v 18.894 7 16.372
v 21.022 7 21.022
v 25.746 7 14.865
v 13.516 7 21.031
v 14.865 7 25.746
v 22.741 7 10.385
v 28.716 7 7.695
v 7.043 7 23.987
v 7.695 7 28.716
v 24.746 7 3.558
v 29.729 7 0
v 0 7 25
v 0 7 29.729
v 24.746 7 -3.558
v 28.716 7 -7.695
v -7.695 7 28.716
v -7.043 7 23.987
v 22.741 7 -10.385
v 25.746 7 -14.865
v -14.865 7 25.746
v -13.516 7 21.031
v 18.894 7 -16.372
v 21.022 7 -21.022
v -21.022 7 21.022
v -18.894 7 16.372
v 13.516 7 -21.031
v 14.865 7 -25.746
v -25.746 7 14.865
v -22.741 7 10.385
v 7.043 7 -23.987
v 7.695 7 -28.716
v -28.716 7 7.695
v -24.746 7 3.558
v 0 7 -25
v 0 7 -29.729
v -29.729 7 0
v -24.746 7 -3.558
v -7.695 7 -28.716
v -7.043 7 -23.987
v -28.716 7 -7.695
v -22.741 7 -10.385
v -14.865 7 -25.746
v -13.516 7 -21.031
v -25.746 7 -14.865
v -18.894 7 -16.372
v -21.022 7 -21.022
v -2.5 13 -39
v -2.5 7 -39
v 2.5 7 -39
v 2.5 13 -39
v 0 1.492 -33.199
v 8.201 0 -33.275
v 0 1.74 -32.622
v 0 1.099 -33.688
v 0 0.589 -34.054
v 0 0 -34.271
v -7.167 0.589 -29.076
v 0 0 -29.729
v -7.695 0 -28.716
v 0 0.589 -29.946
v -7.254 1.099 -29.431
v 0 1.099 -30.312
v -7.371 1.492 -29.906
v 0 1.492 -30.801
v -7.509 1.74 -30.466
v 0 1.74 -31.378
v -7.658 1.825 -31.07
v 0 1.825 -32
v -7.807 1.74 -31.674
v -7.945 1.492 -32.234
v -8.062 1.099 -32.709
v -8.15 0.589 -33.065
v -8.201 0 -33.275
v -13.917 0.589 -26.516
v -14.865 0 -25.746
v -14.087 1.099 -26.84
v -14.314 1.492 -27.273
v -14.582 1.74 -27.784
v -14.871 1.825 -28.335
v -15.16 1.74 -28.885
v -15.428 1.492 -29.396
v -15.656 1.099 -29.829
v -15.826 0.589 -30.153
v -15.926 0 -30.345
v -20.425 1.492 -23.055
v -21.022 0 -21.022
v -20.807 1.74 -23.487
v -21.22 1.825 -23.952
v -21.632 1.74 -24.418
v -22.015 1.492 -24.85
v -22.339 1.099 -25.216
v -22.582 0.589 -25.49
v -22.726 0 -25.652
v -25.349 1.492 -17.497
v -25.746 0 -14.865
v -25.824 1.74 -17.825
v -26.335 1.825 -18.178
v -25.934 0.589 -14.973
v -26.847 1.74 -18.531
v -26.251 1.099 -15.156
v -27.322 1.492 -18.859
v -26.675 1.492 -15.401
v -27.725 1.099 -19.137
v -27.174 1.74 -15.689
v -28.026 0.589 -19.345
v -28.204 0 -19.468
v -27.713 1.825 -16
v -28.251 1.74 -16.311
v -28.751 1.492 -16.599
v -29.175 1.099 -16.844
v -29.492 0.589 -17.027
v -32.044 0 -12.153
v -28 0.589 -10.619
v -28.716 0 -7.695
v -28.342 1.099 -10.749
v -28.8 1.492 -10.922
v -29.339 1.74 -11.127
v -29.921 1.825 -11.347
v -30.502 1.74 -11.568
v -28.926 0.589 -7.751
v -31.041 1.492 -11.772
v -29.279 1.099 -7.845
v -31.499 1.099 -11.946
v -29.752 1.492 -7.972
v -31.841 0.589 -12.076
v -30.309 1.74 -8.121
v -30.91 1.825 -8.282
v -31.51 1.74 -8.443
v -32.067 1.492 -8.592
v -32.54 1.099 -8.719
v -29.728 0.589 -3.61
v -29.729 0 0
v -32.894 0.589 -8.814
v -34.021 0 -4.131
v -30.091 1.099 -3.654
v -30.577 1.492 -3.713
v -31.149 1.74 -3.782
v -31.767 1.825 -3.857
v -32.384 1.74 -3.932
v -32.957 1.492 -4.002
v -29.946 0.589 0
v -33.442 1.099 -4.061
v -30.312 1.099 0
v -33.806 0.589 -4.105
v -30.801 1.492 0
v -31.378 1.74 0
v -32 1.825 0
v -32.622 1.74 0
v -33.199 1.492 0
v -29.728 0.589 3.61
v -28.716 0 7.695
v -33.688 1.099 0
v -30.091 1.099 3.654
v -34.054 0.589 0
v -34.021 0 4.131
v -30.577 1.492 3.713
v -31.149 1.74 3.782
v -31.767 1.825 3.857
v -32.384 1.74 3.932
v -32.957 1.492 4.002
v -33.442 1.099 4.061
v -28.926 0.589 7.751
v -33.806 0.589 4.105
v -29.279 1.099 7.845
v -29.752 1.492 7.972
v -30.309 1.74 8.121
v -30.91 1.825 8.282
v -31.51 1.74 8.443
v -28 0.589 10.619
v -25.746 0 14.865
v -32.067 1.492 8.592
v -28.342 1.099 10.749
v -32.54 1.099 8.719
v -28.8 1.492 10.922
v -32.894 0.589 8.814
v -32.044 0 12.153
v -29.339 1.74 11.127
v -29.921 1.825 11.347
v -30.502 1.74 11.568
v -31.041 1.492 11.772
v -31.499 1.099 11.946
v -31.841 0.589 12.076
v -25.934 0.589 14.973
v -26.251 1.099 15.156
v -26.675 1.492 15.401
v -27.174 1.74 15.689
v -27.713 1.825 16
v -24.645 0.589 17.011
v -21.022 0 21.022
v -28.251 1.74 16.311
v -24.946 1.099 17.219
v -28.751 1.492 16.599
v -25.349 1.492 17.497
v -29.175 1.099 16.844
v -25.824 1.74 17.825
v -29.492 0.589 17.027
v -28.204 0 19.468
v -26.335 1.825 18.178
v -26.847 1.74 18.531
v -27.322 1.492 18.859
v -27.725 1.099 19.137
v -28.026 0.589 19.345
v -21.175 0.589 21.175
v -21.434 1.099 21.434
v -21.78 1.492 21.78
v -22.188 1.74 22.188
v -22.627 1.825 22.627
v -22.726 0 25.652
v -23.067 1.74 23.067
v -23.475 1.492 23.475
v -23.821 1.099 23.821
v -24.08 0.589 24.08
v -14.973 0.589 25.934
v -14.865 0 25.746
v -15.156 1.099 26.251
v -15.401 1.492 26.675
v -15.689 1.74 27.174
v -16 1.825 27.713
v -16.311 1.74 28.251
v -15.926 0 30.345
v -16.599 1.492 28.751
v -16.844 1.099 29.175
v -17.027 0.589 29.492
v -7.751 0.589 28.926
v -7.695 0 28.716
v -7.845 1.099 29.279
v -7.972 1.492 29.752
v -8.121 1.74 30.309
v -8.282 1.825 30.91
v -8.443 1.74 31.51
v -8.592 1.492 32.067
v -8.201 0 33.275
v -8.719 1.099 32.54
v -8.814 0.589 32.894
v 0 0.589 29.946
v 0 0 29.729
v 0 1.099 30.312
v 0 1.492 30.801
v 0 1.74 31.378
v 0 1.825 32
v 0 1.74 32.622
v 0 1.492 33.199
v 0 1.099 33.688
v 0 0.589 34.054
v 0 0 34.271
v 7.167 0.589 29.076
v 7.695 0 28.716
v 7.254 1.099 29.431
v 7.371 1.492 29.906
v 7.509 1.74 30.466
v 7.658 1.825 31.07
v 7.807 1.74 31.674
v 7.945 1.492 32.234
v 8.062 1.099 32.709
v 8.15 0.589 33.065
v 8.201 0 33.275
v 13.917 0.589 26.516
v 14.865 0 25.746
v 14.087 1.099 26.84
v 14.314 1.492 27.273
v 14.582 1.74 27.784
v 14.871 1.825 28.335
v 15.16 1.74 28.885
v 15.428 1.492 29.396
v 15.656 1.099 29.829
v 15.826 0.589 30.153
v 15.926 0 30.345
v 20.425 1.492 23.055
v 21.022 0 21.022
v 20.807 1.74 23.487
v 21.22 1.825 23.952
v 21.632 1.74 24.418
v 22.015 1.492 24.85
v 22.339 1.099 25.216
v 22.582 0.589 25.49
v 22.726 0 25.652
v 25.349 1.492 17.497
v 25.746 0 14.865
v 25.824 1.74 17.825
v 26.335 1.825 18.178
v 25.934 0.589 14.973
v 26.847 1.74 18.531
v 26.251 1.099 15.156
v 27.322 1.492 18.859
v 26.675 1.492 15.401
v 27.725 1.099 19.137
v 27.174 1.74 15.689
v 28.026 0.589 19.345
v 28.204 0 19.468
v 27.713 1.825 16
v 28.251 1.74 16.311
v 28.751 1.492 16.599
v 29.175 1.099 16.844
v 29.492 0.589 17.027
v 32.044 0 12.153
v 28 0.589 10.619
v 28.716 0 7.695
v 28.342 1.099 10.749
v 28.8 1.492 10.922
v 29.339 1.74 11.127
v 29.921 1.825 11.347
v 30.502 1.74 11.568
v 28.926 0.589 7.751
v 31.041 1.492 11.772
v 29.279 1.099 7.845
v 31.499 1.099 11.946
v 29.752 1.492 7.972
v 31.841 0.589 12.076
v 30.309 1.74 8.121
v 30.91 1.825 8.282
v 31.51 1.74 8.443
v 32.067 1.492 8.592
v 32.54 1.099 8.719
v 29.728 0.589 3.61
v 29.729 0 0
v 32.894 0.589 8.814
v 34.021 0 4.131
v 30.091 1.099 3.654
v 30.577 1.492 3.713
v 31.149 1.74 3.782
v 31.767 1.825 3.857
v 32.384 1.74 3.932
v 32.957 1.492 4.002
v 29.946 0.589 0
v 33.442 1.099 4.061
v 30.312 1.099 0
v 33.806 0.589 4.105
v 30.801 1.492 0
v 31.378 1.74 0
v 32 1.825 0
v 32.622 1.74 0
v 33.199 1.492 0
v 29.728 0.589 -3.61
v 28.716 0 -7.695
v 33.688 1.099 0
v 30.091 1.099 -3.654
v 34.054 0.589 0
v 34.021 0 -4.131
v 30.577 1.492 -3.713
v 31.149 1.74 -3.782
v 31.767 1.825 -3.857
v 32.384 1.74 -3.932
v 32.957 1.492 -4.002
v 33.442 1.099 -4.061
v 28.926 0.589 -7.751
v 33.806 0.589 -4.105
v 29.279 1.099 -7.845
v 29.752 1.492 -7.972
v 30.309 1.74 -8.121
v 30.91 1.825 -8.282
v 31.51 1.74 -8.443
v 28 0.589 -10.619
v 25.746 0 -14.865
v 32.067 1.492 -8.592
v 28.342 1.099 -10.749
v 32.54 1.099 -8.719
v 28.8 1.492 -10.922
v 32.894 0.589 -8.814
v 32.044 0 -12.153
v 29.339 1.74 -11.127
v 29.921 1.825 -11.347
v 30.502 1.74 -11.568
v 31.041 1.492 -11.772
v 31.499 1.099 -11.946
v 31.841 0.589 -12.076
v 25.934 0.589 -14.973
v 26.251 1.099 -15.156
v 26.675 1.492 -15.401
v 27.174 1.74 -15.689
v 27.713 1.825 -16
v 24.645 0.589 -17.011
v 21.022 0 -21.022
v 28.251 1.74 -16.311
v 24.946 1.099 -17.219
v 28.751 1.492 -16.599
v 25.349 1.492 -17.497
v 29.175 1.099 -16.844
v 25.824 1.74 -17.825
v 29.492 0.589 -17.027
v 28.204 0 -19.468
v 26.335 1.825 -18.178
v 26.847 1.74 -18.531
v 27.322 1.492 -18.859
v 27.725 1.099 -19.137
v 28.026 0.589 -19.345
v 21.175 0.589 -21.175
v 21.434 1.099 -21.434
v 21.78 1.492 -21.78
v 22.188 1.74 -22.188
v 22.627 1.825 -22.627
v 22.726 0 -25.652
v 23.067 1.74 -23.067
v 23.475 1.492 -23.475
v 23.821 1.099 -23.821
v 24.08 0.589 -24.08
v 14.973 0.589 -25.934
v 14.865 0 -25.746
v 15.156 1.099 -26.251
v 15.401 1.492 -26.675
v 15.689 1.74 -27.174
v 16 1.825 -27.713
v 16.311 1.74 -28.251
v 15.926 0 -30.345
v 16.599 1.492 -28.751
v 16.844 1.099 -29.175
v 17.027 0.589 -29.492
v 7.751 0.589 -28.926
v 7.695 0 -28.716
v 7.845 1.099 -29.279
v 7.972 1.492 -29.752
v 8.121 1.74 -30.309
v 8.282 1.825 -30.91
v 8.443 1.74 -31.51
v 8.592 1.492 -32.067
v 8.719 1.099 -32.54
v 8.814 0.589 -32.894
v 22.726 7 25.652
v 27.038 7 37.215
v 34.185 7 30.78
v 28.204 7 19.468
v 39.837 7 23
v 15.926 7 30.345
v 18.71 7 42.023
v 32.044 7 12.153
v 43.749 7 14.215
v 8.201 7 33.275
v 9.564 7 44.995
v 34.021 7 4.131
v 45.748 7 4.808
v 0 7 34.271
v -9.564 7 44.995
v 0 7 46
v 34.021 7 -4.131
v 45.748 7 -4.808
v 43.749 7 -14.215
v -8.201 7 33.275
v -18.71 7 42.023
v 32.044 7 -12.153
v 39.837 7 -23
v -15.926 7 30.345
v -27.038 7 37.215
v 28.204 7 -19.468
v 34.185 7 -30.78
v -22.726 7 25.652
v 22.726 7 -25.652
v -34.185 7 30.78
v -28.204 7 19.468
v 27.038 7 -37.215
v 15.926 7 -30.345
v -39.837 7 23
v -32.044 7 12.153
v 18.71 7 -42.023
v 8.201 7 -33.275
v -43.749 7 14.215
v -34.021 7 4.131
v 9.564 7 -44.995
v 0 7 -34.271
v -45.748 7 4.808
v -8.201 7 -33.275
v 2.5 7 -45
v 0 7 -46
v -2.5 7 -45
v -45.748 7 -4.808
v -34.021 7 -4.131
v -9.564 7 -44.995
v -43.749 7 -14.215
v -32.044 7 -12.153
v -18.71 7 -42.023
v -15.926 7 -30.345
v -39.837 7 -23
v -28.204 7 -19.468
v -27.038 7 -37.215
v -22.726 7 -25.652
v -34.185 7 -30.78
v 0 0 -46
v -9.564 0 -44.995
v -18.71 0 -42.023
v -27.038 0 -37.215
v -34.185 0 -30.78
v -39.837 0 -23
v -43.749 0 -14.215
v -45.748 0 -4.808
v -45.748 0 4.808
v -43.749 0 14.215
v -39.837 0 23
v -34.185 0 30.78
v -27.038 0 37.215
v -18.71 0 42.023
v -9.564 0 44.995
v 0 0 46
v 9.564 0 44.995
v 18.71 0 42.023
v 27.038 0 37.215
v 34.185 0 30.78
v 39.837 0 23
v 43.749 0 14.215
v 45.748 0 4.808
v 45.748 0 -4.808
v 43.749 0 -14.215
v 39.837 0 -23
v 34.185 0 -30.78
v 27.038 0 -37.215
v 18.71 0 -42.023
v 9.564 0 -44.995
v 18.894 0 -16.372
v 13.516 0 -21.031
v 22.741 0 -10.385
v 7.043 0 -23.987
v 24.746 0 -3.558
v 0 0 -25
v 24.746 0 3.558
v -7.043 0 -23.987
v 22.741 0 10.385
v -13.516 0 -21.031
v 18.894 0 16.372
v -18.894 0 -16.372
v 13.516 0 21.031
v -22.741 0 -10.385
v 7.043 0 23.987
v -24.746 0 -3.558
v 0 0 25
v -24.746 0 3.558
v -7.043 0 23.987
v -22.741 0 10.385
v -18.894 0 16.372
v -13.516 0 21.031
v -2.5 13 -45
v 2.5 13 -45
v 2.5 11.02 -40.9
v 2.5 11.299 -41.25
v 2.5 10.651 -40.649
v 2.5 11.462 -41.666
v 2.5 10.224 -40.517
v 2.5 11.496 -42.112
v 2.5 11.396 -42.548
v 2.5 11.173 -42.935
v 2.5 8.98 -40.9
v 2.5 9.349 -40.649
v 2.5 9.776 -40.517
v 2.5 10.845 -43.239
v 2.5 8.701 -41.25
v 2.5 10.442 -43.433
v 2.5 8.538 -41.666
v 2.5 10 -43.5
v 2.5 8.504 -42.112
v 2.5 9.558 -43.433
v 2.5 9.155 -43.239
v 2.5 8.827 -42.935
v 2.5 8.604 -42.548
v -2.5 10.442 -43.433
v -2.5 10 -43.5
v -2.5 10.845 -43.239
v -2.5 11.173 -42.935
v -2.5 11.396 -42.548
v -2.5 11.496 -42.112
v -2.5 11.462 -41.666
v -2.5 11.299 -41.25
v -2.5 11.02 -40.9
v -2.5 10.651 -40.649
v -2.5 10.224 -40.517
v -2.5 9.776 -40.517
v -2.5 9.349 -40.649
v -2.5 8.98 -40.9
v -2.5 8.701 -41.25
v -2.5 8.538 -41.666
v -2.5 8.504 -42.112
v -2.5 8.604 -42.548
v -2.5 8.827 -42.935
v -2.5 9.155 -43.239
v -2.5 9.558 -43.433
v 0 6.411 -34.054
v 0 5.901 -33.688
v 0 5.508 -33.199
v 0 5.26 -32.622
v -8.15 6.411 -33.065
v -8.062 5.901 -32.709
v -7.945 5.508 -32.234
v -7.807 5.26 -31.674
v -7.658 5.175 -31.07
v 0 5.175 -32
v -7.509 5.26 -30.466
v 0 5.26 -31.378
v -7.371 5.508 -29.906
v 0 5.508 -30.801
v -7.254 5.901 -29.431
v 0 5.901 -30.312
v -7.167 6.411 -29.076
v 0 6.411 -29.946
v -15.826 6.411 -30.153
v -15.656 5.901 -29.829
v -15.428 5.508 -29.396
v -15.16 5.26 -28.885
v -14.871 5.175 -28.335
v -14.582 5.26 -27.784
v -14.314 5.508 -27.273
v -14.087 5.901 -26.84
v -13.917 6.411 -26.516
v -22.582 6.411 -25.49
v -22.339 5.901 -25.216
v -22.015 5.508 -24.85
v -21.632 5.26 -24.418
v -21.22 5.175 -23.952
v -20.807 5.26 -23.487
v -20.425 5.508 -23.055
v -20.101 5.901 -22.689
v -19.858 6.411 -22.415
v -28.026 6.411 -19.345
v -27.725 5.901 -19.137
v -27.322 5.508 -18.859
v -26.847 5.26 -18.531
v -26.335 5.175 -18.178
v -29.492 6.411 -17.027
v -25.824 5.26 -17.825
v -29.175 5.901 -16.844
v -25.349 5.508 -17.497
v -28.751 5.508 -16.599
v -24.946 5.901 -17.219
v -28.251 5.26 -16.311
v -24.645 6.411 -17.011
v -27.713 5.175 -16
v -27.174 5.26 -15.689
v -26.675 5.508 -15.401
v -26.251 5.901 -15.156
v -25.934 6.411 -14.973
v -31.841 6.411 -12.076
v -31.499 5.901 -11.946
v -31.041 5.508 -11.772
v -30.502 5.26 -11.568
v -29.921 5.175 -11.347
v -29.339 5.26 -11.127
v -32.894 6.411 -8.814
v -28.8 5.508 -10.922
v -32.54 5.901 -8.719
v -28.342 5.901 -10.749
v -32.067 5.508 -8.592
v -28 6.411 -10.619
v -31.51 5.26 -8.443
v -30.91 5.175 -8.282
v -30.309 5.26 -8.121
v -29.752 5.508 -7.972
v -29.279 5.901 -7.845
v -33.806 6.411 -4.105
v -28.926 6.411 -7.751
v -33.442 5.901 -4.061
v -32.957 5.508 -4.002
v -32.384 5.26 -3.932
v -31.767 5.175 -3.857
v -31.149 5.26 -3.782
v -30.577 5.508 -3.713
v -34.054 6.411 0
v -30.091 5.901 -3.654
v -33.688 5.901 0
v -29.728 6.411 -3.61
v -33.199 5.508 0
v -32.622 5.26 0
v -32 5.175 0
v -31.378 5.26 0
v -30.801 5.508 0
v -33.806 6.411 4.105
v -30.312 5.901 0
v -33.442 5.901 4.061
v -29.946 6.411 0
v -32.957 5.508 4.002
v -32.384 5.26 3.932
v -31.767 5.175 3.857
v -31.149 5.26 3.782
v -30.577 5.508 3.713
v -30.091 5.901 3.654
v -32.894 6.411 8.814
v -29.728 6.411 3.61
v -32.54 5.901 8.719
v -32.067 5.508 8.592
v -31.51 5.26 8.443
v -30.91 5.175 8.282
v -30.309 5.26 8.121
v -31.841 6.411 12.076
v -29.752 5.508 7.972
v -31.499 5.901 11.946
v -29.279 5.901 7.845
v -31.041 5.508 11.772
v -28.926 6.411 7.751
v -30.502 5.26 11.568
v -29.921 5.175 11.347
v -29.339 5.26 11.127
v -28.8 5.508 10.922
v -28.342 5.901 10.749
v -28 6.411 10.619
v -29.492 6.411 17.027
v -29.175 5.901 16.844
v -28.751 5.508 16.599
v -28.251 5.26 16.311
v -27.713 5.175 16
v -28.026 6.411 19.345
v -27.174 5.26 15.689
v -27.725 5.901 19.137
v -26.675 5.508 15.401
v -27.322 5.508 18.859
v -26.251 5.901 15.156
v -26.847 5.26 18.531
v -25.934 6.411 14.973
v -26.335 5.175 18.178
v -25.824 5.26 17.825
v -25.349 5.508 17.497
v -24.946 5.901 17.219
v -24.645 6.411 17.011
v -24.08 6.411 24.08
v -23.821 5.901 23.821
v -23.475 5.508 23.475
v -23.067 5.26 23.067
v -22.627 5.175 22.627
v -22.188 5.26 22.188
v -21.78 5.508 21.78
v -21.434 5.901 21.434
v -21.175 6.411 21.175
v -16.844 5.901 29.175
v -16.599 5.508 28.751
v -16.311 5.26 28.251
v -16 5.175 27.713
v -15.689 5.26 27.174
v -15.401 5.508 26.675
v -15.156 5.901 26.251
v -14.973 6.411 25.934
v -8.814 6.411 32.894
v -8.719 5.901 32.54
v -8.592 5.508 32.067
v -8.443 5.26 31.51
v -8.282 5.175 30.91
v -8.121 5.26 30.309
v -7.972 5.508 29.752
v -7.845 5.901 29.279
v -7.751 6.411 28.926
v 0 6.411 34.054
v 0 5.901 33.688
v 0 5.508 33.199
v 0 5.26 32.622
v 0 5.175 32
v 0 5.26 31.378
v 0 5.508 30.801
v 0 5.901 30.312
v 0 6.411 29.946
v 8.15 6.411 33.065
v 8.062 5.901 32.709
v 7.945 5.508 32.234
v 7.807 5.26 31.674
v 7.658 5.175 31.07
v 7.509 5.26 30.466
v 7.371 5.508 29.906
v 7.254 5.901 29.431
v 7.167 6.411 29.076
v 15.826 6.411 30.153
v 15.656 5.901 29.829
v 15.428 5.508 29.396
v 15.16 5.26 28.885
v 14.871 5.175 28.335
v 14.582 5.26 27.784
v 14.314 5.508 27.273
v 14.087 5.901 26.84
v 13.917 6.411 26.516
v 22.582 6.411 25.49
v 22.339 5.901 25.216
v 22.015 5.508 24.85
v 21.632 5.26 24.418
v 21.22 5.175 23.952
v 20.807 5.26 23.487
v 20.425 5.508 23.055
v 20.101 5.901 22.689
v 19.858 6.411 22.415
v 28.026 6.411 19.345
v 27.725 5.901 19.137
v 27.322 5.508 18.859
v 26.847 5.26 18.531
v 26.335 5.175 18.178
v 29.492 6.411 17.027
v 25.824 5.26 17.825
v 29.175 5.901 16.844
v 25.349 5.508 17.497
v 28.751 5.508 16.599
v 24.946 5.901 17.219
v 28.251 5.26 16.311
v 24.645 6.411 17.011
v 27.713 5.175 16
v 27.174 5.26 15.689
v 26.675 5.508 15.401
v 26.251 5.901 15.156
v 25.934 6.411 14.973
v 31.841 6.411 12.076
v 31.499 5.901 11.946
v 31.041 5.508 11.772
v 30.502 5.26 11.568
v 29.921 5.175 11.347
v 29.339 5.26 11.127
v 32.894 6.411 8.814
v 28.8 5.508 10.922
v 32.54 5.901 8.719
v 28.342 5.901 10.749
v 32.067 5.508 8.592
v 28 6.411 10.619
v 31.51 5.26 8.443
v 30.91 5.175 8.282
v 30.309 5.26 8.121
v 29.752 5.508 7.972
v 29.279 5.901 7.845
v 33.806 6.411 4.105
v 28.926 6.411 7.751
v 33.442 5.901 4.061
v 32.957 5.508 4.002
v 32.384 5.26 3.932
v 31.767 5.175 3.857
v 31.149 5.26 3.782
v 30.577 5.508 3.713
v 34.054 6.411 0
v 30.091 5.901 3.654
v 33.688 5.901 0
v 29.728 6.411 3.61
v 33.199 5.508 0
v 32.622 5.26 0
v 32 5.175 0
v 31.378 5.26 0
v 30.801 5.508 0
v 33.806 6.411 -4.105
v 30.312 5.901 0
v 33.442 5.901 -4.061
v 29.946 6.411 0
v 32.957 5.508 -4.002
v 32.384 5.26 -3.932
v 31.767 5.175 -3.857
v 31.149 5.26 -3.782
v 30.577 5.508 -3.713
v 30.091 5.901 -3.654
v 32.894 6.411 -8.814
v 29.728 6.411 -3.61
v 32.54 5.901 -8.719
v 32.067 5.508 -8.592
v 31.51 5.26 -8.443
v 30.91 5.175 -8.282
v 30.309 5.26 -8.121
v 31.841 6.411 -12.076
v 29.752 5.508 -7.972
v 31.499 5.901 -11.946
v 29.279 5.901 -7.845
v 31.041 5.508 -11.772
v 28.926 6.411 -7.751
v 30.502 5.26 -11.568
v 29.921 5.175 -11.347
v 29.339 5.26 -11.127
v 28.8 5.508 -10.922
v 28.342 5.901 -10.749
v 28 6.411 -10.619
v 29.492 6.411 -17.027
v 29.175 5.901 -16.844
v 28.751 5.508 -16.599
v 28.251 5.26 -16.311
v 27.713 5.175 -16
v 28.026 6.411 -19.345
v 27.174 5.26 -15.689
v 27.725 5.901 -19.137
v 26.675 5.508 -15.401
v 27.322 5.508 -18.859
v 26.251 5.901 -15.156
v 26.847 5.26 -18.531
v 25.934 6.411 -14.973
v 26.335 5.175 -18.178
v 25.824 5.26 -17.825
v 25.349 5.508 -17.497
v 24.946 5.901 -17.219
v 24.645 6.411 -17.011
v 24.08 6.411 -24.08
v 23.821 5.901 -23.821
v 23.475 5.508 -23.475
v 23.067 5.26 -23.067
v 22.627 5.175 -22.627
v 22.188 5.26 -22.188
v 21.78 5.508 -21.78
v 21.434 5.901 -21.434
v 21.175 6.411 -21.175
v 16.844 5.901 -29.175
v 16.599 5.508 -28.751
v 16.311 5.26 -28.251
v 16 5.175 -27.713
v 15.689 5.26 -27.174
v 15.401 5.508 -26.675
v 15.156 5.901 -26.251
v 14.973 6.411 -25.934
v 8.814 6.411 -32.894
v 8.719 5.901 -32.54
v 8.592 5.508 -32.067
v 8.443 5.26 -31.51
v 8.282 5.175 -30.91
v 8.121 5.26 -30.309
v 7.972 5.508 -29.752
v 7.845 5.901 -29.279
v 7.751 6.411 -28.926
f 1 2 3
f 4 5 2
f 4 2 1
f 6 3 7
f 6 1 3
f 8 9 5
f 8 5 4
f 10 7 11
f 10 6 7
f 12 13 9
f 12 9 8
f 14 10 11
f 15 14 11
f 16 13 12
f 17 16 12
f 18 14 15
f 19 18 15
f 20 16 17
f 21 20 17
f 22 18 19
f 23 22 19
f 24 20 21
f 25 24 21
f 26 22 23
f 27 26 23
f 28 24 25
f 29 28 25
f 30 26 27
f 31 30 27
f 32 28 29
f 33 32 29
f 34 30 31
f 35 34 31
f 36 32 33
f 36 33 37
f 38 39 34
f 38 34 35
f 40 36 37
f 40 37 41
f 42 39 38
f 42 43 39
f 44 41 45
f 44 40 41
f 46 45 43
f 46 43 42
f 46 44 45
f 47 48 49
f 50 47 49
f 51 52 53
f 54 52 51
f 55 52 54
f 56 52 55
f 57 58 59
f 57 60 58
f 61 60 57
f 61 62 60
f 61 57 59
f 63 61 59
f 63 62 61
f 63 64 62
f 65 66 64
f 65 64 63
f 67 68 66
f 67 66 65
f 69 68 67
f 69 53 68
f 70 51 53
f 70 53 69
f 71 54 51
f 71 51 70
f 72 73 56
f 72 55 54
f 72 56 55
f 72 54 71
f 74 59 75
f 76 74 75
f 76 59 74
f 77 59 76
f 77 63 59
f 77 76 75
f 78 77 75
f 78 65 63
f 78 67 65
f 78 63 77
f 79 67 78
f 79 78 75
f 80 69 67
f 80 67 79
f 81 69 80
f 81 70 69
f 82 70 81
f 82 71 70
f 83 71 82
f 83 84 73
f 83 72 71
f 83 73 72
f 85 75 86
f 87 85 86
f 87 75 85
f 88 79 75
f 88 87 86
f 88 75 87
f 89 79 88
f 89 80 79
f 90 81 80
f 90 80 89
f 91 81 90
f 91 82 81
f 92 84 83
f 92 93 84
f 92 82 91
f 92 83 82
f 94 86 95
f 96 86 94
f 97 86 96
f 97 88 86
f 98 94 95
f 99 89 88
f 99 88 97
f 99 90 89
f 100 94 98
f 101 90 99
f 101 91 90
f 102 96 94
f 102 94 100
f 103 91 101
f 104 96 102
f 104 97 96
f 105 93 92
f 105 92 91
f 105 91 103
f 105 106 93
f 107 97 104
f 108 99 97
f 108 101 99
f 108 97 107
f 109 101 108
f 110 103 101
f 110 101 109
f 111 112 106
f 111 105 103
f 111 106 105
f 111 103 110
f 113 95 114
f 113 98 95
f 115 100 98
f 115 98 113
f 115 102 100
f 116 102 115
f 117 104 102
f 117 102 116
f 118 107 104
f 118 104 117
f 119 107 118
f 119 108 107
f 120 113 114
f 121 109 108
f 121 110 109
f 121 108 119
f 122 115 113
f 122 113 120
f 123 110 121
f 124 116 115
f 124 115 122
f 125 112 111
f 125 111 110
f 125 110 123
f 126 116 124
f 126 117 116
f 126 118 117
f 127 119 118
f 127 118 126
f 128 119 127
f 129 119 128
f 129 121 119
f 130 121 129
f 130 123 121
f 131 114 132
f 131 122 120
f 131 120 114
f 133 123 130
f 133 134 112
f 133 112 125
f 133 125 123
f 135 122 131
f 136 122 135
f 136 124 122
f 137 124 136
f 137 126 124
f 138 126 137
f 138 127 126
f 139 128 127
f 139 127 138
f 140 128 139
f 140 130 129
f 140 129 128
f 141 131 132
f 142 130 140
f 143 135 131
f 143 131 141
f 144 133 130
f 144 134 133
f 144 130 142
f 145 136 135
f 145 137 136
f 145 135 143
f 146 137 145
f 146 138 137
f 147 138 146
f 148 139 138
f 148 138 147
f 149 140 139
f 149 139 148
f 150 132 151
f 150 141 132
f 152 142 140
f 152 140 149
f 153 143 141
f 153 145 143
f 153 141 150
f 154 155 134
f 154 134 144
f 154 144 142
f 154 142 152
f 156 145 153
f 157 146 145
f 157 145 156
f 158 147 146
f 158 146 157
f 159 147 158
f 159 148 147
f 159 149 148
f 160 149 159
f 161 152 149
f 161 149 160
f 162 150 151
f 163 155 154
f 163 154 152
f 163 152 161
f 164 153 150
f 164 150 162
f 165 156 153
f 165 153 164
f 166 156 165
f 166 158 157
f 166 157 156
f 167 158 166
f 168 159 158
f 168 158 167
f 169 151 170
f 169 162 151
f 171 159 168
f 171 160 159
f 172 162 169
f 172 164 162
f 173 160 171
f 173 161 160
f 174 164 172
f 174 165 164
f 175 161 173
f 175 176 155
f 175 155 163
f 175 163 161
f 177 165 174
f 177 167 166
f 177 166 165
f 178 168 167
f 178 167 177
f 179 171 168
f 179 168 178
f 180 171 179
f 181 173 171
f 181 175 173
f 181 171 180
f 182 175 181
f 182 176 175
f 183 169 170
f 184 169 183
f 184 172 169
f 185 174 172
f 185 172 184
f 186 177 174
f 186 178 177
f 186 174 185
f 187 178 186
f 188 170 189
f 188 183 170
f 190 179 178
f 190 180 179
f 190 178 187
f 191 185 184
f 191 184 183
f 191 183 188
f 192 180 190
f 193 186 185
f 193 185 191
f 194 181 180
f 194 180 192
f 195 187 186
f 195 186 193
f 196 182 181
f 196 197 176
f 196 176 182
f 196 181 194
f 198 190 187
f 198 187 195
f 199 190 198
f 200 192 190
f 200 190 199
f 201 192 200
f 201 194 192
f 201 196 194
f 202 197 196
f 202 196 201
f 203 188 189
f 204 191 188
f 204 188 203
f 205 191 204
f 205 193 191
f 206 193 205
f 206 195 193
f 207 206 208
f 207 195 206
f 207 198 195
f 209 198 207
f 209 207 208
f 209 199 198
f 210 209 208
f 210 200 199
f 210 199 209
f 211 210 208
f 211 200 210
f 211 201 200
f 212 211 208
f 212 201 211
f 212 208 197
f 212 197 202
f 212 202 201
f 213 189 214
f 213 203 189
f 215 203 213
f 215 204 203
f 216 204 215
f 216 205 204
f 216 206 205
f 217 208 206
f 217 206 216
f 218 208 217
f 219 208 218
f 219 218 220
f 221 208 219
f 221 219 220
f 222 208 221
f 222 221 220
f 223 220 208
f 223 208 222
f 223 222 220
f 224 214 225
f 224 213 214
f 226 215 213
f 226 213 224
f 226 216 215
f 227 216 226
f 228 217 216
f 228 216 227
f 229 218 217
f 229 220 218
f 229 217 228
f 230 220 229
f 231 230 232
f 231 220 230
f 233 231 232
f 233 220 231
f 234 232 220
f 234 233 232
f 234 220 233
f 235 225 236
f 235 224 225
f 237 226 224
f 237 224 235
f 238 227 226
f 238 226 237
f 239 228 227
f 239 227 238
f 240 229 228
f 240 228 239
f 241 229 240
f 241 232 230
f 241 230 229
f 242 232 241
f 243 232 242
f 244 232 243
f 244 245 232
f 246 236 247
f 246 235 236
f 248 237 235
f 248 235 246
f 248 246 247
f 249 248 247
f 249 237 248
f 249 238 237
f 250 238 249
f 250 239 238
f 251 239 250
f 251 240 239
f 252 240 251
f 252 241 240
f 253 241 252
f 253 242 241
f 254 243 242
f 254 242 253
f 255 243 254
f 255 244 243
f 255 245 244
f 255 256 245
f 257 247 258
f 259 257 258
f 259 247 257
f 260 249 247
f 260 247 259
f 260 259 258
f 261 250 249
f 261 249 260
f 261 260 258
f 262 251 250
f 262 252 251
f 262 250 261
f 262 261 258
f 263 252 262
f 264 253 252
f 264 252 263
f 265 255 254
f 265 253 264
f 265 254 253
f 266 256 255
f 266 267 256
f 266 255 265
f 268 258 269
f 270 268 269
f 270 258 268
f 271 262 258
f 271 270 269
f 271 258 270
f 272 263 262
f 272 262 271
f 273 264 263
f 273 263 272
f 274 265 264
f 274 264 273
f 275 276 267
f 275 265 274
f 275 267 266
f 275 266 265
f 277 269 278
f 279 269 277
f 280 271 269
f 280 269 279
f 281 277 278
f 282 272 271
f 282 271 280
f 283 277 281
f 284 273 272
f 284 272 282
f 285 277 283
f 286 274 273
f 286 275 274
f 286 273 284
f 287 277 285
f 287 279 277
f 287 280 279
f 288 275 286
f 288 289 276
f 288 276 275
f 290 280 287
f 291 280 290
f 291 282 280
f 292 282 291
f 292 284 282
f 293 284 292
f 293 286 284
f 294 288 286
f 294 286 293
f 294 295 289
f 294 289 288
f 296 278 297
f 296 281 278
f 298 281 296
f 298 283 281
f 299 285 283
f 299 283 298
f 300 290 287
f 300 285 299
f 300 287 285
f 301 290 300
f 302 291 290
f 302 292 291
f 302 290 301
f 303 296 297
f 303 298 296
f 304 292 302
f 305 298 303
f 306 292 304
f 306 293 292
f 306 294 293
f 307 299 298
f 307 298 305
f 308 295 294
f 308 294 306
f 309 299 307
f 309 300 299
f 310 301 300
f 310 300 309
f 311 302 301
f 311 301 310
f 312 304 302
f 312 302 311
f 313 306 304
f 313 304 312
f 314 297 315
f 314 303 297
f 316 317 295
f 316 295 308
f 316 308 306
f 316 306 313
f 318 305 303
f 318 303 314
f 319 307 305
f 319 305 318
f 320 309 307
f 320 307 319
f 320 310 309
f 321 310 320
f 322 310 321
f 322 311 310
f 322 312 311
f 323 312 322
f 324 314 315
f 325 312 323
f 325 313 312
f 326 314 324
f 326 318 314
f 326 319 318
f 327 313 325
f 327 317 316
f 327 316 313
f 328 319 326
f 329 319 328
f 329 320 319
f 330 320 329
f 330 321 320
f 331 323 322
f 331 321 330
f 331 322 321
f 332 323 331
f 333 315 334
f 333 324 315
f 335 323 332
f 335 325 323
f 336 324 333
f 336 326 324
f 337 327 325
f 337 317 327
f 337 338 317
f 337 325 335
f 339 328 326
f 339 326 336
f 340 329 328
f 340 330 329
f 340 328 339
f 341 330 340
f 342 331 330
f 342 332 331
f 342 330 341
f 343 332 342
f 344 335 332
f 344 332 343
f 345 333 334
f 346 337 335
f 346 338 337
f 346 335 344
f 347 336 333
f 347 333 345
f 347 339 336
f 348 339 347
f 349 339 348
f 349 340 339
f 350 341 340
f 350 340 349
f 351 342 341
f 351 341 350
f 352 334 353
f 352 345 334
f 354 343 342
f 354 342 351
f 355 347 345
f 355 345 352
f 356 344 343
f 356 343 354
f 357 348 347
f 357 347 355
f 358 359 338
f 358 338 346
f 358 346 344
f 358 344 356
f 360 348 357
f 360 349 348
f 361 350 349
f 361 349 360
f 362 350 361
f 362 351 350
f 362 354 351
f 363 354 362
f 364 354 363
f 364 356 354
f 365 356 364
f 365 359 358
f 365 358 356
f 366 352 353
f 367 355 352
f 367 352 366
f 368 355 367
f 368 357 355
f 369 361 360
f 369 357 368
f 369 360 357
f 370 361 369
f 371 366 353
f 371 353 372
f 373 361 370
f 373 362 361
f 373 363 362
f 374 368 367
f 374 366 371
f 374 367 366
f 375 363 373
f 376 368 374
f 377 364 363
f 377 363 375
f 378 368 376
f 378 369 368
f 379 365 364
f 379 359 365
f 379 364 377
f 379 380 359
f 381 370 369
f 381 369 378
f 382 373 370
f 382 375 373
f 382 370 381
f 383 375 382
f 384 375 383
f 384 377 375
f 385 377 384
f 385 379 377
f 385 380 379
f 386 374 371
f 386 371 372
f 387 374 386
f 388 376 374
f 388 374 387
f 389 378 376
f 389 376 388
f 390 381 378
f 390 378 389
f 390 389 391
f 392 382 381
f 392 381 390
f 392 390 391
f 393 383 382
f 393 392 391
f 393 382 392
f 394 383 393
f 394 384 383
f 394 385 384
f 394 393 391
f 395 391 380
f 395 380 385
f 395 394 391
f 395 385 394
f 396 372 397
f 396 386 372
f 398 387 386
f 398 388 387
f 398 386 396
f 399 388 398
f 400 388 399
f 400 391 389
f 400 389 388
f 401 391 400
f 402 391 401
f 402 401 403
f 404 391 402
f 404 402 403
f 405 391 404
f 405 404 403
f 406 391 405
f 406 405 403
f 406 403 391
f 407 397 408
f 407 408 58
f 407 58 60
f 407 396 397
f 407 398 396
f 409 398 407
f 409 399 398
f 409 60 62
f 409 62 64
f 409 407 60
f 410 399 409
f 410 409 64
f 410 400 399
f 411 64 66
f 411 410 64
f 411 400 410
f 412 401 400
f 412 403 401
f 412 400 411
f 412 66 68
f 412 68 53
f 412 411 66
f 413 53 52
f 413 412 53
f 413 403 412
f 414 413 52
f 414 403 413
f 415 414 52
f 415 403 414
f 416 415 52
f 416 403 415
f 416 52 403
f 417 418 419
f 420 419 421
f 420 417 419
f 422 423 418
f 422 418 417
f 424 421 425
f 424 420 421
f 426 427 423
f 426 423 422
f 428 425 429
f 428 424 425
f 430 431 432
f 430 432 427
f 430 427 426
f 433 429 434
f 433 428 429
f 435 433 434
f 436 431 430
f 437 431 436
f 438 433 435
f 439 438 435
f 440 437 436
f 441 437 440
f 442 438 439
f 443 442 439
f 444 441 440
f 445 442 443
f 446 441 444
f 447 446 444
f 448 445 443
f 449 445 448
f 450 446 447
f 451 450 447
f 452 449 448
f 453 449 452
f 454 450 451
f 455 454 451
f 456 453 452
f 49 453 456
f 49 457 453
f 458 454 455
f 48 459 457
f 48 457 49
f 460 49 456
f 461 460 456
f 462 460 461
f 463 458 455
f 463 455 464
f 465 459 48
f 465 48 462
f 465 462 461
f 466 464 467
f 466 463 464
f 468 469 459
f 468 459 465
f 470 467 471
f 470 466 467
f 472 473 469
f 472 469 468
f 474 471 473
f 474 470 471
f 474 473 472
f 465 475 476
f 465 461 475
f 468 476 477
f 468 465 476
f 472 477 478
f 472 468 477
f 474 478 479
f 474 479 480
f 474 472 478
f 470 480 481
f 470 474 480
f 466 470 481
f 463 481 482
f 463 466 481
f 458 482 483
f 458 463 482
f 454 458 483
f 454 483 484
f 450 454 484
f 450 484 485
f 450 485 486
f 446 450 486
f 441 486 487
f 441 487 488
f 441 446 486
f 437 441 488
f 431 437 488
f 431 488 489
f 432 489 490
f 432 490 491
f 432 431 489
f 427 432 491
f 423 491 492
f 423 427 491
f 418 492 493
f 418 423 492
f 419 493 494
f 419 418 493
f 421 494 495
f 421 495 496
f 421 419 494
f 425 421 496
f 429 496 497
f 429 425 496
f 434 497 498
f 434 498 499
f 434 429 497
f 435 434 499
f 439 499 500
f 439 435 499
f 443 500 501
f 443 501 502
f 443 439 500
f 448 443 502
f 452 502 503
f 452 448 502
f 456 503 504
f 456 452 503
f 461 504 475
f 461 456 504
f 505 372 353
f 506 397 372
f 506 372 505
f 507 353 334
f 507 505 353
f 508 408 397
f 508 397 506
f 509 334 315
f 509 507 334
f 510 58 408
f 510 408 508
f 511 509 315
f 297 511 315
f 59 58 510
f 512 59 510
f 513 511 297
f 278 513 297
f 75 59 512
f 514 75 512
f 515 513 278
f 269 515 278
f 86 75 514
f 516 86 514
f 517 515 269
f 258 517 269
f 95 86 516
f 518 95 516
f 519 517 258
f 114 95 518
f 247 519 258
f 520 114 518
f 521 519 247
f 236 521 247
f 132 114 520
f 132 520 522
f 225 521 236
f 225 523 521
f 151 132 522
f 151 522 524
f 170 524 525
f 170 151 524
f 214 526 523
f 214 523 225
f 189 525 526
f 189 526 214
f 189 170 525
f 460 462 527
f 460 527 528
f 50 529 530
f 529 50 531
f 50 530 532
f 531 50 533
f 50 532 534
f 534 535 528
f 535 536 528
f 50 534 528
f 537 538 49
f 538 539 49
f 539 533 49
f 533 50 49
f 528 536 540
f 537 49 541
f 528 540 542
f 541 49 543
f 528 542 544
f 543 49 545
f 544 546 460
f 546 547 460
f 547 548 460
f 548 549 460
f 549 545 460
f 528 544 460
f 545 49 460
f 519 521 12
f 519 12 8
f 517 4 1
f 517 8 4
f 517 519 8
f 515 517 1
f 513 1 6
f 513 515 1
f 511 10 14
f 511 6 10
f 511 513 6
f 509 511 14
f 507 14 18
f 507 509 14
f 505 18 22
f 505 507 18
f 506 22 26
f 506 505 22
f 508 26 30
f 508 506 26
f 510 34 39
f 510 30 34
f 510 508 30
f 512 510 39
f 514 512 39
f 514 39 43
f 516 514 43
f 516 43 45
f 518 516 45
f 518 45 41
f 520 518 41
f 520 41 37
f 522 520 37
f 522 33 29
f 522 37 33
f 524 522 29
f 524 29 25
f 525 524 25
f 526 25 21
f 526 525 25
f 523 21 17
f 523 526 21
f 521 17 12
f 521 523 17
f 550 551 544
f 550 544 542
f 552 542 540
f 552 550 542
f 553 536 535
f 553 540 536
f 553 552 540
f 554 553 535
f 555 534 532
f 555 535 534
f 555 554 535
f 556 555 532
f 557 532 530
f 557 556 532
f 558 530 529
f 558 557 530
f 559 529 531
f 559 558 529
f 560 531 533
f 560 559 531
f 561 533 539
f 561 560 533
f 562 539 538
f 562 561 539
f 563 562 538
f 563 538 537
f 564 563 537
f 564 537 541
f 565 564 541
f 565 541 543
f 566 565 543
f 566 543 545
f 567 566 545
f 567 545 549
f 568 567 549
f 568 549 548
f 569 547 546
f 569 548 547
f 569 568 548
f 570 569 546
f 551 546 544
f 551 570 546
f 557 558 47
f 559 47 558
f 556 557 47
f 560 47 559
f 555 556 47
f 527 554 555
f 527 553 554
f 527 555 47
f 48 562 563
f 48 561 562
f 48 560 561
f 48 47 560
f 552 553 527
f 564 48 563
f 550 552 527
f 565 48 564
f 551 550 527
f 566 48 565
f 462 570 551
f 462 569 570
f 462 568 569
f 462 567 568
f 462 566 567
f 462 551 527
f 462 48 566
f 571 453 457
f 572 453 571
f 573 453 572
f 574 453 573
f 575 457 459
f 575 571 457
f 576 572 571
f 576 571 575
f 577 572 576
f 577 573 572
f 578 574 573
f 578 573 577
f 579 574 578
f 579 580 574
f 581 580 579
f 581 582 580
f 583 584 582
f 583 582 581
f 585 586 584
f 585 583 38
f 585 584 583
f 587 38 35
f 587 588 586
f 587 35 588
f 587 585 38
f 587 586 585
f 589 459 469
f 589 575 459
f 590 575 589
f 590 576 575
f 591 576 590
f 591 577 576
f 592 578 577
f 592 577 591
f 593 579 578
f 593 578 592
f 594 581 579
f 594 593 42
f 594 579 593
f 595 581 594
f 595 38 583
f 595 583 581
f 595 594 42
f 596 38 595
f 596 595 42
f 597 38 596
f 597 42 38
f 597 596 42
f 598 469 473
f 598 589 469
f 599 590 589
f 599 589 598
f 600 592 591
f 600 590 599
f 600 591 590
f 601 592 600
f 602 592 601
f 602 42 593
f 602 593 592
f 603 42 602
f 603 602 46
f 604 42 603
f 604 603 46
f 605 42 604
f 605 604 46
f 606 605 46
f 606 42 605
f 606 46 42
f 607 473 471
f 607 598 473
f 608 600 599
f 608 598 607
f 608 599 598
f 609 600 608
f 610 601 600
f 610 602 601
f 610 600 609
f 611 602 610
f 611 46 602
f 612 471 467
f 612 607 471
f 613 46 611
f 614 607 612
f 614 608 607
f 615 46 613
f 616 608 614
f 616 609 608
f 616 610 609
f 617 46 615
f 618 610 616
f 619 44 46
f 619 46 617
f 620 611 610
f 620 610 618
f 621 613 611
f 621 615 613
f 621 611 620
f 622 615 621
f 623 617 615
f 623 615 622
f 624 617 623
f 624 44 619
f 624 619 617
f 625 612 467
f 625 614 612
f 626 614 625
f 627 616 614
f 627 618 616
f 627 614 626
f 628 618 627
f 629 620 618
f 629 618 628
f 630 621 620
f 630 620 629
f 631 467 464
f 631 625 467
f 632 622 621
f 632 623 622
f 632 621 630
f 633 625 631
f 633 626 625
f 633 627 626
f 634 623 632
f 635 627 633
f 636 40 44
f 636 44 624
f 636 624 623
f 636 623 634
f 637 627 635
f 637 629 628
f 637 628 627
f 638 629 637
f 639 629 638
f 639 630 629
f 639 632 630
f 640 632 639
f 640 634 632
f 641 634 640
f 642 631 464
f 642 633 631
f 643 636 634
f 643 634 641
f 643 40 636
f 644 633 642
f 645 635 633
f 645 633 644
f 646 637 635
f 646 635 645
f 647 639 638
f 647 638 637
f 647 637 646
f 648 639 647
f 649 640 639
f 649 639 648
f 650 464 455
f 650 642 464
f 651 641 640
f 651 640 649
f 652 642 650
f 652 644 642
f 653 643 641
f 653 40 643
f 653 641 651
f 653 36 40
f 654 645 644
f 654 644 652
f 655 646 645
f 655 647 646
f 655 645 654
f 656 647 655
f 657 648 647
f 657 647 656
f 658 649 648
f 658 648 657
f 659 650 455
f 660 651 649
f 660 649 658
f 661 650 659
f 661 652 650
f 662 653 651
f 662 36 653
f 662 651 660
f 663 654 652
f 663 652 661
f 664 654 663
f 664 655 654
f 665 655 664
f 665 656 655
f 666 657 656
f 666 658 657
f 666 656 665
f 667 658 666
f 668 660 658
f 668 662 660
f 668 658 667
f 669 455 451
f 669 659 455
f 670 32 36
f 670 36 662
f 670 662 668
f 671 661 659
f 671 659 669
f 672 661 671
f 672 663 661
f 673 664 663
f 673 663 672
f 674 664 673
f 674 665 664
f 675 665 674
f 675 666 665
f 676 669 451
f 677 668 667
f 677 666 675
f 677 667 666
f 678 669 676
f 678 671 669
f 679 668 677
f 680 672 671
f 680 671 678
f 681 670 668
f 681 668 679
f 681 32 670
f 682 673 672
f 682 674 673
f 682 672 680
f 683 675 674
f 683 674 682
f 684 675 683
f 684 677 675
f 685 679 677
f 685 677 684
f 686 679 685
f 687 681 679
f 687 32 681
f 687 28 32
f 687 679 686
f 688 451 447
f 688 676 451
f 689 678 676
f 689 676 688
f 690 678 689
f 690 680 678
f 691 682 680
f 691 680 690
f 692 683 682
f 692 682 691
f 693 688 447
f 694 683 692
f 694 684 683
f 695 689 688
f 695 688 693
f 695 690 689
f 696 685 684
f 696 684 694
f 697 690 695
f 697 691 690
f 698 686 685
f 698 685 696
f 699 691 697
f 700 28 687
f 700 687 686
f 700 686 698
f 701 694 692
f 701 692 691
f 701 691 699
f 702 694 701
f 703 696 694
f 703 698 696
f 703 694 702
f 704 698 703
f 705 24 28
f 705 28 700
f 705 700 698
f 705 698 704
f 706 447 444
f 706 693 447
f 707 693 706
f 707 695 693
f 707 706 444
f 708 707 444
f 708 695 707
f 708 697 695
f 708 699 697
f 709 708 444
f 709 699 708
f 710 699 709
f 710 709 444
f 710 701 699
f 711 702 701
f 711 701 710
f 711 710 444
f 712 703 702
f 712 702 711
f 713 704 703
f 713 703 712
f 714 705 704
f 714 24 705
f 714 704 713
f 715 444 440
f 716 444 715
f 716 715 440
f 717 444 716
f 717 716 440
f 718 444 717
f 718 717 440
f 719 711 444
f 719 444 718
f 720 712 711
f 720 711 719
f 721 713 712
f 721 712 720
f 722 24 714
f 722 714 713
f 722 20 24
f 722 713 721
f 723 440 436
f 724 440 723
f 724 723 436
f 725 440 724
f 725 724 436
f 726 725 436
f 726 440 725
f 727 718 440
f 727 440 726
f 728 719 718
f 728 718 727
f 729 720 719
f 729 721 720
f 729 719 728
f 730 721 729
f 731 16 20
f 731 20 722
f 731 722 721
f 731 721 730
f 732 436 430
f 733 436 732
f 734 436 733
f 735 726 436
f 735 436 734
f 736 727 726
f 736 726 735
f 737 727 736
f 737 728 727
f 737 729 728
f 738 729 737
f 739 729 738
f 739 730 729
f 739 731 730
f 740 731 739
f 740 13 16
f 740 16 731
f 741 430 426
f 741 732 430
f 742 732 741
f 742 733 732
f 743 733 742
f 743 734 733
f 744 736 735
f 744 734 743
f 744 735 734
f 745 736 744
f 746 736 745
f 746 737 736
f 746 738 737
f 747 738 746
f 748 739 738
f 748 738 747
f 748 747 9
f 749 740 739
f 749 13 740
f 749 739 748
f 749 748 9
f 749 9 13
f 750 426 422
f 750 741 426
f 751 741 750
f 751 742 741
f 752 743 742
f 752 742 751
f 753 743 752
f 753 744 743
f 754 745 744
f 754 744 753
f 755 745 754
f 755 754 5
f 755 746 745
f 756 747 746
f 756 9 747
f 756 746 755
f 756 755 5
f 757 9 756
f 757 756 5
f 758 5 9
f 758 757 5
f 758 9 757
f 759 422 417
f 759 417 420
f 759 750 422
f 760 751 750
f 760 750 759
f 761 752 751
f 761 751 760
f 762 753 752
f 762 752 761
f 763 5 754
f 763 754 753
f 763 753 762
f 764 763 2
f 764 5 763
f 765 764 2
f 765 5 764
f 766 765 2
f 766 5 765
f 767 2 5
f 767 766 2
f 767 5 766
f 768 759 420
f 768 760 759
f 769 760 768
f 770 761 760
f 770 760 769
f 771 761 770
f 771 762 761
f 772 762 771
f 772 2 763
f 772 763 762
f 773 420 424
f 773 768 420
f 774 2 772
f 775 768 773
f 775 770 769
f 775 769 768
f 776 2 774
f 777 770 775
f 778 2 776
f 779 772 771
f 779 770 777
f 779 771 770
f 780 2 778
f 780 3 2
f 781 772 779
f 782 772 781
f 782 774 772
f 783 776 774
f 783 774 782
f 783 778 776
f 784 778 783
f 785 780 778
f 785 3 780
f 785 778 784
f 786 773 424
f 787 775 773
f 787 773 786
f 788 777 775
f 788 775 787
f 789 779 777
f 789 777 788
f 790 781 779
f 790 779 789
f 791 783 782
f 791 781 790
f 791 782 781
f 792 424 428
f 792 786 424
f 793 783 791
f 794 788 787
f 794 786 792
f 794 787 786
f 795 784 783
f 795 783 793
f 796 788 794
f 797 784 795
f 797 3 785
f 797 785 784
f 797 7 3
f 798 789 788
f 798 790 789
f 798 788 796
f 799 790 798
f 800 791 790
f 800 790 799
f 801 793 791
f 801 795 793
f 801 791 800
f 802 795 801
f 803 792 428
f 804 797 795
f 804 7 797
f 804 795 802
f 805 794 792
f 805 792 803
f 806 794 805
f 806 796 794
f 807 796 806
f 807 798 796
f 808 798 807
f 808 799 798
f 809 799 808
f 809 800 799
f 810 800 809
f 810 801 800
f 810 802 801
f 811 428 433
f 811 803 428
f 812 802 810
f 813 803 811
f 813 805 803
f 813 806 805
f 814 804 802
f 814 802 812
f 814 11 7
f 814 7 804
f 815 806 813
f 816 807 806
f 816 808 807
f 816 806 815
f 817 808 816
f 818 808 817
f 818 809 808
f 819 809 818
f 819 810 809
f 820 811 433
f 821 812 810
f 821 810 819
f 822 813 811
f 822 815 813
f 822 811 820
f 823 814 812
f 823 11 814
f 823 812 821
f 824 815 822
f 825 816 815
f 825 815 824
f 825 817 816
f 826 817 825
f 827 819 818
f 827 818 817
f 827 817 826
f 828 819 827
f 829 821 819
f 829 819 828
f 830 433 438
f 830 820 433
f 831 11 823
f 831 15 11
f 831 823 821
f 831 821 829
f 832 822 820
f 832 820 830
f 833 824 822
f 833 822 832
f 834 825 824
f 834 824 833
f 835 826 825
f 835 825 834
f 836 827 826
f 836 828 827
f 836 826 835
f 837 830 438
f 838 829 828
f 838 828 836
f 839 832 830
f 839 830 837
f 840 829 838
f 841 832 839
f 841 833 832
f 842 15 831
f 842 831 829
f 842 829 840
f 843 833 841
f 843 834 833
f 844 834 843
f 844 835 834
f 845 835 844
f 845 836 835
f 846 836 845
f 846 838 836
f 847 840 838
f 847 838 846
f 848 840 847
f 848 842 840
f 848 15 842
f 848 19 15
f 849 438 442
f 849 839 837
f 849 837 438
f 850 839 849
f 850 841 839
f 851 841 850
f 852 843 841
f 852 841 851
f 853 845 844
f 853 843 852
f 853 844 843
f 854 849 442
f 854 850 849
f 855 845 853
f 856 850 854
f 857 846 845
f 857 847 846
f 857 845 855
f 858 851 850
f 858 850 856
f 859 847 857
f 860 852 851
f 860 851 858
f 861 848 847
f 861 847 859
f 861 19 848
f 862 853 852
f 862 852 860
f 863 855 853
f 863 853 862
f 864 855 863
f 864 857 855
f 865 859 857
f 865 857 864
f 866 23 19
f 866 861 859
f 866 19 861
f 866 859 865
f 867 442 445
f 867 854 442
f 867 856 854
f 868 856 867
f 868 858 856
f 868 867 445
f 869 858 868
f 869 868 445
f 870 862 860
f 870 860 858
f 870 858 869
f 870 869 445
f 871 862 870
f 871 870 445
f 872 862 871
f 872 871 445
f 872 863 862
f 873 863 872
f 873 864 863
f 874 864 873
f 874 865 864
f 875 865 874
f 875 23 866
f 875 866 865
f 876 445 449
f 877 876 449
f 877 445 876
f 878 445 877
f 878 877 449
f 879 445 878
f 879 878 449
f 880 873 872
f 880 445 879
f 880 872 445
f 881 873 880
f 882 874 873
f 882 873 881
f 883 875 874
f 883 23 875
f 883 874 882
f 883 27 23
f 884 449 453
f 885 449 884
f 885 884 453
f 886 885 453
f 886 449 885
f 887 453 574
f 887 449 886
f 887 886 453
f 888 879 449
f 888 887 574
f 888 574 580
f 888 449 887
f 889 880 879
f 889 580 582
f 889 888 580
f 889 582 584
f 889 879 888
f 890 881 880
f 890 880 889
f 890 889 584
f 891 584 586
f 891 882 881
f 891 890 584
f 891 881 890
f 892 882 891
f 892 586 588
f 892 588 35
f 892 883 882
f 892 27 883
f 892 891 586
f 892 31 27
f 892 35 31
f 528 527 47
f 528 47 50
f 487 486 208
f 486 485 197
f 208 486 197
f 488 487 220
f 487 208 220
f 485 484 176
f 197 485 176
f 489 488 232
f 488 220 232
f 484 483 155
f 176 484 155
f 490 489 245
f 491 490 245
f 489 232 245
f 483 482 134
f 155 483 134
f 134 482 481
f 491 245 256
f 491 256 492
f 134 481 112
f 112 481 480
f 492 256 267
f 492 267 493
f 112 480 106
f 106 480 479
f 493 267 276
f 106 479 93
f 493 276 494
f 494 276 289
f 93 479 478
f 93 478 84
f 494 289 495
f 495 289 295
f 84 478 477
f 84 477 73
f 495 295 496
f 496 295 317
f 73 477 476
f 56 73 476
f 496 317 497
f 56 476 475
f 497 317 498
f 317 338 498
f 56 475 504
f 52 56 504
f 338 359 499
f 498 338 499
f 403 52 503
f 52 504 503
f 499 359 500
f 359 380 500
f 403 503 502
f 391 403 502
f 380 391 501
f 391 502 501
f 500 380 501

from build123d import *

# Parameters (mm, degrees)
CUT_EXTRUDE1_DEPTH      = 66.429351212
CUT_EXTRUDE1_DEPTH_BACK = 66.429351212
SKETCH4_R               = 25
SKETCH5_W               = 5
SKETCH5_H               = 6
BOSS_EXTRUDE1_DEPTH     = 13
CUT_EXTRUDE2_DEPTH      = 67.340033162
CUT_EXTRUDE2_DEPTH_BACK = 67.340033162
SKETCH6_R               = 1.5


with BuildPart() as part:
    # Sketch3 → Revolve1 (revolve)
    with BuildSketch(Plane.XY, mode=Mode.PRIVATE) as revolve1_sk:
        with BuildLine():
            Line((0, 0), (-29.729399859, 0))
            ThreePointArc((-29.729399859, 0), (-32, 1.825), (-34.270600141, 0))
            Line((-34.270600141, 0), (-46, 0))
            Line((-46, 0), (-46, 7))
            Line((-46, 7), (-34.270600141, 7))
            ThreePointArc((-34.270600141, 7), (-32, 5.175), (-29.729399859, 7))
            Line((-29.729399859, 7), (0, 7))
            Line((0, 7), (0, 0))
        make_face()
    revolve(revolve1_sk.sketch.rotate(Axis((0, 0, 0), (0, 1, 0)), 270), axis=Axis((0, 0, 0), (0, 1, 0)))

    # Sketch4 → Cut-Extrude1 (cut, two sides: drawn at the far end of the back side and taken through both)
    with BuildSketch(Plane(origin=(0, 7, 0), x_dir=(1, 0, 0), z_dir=(0, 1, 0)).offset(-CUT_EXTRUDE1_DEPTH_BACK)):
        with Locations(Location((0, 0, 0), (0, 0, 270))):
            Circle(SKETCH4_R)
    extrude(amount=CUT_EXTRUDE1_DEPTH + CUT_EXTRUDE1_DEPTH_BACK, mode=Mode.SUBTRACT)

    # Sketch5 → Boss-Extrude1 (add)
    with BuildSketch(Plane(origin=(0, 0, 0), x_dir=(1, 0, 0), z_dir=(0, 1, 0))):
        with Locations((0, 42)):
            Rectangle(SKETCH5_W, SKETCH5_H)
    extrude(amount=BOSS_EXTRUDE1_DEPTH)

    # Sketch6 → Cut-Extrude2 (cut, two sides: drawn at the far end of the back side and taken through both)
    with BuildSketch(Plane(origin=(0, 0, 0), x_dir=(0, 0, -1), z_dir=(1, 0, 0)).offset(-CUT_EXTRUDE2_DEPTH_BACK)):
        with Locations((42, 10)):
            Circle(SKETCH6_R)
    extrude(amount=CUT_EXTRUDE2_DEPTH + CUT_EXTRUDE2_DEPTH_BACK, mode=Mode.SUBTRACT)


solid = part.part
